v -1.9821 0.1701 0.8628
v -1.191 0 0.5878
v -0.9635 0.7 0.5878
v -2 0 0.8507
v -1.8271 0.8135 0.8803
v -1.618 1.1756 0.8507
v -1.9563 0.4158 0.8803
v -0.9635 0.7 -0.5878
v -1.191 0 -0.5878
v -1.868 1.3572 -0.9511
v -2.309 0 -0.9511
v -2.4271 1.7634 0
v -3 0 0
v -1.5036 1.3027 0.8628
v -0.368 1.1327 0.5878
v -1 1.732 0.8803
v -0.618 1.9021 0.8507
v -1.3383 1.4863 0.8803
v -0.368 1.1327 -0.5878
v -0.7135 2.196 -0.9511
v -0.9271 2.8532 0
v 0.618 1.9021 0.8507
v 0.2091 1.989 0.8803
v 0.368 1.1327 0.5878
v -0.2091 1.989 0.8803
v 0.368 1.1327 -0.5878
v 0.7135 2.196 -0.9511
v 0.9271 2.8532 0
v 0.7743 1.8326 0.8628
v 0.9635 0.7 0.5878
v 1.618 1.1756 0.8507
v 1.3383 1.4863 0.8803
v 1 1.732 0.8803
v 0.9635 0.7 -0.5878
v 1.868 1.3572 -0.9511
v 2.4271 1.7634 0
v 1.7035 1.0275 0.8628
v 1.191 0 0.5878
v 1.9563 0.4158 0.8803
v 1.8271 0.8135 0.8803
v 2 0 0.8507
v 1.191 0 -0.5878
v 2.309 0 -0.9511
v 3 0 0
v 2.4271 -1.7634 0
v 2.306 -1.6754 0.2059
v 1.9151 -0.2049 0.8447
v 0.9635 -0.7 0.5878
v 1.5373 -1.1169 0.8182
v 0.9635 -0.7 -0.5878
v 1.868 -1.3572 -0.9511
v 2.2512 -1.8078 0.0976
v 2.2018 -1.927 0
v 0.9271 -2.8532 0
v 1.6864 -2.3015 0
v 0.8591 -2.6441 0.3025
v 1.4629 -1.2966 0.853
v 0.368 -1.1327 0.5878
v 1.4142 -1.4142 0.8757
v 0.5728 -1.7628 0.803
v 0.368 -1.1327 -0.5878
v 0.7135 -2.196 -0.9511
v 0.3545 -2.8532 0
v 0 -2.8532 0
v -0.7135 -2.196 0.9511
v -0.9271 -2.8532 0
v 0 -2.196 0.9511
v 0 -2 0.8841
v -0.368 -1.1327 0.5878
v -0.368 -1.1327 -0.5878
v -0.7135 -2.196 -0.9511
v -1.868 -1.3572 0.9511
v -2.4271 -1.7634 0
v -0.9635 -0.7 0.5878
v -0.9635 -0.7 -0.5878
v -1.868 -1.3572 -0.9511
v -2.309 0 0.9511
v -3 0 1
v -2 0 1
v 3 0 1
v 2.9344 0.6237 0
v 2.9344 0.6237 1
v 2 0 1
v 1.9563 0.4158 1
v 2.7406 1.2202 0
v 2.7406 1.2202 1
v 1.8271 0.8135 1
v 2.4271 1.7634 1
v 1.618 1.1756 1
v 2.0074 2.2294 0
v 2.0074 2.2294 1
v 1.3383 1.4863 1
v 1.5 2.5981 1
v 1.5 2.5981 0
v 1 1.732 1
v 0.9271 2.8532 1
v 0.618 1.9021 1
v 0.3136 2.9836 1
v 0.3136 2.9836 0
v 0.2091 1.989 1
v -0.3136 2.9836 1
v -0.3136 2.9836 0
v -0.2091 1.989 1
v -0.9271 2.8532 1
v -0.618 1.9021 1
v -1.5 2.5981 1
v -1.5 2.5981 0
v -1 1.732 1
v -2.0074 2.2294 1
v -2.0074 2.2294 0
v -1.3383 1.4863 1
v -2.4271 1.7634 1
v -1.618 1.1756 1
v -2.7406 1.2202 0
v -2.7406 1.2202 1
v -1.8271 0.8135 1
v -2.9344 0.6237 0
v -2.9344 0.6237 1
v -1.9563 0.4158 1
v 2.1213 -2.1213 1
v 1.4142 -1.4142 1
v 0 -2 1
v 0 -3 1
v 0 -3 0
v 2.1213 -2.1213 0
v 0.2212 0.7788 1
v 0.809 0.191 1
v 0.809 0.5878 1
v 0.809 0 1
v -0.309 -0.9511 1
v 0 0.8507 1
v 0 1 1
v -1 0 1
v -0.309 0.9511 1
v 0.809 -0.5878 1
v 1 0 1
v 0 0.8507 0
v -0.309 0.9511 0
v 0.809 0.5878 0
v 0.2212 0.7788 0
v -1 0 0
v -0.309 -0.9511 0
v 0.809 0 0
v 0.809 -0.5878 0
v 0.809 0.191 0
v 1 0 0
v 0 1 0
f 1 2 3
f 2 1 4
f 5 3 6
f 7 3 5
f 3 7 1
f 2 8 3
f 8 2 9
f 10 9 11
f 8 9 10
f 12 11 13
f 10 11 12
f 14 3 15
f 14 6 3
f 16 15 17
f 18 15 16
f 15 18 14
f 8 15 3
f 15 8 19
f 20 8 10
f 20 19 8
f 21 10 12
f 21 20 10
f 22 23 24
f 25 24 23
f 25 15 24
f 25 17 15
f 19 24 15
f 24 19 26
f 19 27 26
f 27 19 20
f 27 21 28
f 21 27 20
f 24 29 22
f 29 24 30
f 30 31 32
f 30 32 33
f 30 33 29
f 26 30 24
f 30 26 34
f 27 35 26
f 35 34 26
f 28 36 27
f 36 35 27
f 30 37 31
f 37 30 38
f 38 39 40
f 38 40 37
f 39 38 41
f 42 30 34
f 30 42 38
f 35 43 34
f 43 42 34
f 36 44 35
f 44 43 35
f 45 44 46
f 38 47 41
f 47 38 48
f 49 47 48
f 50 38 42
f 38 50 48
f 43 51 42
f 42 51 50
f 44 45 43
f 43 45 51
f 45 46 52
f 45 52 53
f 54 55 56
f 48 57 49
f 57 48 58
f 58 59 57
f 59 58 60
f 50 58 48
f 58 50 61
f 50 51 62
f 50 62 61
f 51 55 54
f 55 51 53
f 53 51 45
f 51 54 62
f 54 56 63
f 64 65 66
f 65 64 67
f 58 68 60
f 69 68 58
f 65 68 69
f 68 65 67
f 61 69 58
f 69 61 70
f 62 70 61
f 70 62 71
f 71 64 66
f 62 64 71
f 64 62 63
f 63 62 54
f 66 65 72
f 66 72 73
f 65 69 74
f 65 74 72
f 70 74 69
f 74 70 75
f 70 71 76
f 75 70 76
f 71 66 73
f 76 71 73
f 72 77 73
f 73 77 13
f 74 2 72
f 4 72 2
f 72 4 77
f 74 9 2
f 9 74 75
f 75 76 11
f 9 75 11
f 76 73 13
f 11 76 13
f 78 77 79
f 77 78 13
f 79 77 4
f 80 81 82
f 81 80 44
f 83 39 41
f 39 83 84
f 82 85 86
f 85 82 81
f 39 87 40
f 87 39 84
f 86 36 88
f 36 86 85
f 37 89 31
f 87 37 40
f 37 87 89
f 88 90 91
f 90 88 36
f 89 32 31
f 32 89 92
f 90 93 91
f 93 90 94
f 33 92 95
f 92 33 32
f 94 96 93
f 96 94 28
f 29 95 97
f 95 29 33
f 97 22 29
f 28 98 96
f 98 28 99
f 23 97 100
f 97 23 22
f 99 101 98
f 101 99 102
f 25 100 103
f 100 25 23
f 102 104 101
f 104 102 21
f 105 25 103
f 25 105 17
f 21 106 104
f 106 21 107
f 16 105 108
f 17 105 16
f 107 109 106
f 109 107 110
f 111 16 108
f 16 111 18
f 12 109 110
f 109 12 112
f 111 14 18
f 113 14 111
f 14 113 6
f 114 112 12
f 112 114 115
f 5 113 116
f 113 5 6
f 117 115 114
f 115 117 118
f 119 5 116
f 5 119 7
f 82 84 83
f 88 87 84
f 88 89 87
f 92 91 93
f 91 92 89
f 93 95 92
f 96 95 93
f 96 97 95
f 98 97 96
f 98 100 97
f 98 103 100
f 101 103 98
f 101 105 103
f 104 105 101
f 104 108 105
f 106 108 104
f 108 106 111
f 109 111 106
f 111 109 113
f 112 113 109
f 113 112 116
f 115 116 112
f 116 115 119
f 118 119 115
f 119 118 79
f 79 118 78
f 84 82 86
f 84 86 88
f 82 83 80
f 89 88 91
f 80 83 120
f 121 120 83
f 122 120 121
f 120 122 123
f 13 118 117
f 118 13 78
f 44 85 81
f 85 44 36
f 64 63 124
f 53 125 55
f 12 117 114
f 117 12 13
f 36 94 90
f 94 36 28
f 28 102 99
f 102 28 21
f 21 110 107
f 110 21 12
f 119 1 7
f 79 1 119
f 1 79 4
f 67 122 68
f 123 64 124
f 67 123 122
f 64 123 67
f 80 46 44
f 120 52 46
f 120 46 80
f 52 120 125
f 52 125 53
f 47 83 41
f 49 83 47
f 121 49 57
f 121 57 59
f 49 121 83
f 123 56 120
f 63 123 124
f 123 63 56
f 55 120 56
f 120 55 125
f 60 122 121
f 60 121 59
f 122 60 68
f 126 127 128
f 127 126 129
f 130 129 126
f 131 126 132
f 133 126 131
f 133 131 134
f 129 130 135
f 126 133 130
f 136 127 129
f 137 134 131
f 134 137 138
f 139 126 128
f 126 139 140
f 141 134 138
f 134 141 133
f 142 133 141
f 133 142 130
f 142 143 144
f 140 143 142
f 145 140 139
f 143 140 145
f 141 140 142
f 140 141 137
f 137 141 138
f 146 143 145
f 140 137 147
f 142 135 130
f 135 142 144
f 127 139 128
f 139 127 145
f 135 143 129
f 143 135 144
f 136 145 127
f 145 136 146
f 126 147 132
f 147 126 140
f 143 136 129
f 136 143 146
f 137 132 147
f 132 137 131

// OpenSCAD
rotate_extrude() translate([2, 0]) circle();
rotate_extrude(angle = 180, convexity = 4, $fn = 30) translate([2, 0]) square();
rotate_extrude(start = 90, angle = -90) translate([2, 0]) square();
rotate_extrude(angle = 360) square();
rotate_extrude(start = 0) square();
rotate_extrude(angle = 90, start = 45) square();
rotate_extrude(angle = 400) square();
rotate_extrude(convexity = 1) square();
